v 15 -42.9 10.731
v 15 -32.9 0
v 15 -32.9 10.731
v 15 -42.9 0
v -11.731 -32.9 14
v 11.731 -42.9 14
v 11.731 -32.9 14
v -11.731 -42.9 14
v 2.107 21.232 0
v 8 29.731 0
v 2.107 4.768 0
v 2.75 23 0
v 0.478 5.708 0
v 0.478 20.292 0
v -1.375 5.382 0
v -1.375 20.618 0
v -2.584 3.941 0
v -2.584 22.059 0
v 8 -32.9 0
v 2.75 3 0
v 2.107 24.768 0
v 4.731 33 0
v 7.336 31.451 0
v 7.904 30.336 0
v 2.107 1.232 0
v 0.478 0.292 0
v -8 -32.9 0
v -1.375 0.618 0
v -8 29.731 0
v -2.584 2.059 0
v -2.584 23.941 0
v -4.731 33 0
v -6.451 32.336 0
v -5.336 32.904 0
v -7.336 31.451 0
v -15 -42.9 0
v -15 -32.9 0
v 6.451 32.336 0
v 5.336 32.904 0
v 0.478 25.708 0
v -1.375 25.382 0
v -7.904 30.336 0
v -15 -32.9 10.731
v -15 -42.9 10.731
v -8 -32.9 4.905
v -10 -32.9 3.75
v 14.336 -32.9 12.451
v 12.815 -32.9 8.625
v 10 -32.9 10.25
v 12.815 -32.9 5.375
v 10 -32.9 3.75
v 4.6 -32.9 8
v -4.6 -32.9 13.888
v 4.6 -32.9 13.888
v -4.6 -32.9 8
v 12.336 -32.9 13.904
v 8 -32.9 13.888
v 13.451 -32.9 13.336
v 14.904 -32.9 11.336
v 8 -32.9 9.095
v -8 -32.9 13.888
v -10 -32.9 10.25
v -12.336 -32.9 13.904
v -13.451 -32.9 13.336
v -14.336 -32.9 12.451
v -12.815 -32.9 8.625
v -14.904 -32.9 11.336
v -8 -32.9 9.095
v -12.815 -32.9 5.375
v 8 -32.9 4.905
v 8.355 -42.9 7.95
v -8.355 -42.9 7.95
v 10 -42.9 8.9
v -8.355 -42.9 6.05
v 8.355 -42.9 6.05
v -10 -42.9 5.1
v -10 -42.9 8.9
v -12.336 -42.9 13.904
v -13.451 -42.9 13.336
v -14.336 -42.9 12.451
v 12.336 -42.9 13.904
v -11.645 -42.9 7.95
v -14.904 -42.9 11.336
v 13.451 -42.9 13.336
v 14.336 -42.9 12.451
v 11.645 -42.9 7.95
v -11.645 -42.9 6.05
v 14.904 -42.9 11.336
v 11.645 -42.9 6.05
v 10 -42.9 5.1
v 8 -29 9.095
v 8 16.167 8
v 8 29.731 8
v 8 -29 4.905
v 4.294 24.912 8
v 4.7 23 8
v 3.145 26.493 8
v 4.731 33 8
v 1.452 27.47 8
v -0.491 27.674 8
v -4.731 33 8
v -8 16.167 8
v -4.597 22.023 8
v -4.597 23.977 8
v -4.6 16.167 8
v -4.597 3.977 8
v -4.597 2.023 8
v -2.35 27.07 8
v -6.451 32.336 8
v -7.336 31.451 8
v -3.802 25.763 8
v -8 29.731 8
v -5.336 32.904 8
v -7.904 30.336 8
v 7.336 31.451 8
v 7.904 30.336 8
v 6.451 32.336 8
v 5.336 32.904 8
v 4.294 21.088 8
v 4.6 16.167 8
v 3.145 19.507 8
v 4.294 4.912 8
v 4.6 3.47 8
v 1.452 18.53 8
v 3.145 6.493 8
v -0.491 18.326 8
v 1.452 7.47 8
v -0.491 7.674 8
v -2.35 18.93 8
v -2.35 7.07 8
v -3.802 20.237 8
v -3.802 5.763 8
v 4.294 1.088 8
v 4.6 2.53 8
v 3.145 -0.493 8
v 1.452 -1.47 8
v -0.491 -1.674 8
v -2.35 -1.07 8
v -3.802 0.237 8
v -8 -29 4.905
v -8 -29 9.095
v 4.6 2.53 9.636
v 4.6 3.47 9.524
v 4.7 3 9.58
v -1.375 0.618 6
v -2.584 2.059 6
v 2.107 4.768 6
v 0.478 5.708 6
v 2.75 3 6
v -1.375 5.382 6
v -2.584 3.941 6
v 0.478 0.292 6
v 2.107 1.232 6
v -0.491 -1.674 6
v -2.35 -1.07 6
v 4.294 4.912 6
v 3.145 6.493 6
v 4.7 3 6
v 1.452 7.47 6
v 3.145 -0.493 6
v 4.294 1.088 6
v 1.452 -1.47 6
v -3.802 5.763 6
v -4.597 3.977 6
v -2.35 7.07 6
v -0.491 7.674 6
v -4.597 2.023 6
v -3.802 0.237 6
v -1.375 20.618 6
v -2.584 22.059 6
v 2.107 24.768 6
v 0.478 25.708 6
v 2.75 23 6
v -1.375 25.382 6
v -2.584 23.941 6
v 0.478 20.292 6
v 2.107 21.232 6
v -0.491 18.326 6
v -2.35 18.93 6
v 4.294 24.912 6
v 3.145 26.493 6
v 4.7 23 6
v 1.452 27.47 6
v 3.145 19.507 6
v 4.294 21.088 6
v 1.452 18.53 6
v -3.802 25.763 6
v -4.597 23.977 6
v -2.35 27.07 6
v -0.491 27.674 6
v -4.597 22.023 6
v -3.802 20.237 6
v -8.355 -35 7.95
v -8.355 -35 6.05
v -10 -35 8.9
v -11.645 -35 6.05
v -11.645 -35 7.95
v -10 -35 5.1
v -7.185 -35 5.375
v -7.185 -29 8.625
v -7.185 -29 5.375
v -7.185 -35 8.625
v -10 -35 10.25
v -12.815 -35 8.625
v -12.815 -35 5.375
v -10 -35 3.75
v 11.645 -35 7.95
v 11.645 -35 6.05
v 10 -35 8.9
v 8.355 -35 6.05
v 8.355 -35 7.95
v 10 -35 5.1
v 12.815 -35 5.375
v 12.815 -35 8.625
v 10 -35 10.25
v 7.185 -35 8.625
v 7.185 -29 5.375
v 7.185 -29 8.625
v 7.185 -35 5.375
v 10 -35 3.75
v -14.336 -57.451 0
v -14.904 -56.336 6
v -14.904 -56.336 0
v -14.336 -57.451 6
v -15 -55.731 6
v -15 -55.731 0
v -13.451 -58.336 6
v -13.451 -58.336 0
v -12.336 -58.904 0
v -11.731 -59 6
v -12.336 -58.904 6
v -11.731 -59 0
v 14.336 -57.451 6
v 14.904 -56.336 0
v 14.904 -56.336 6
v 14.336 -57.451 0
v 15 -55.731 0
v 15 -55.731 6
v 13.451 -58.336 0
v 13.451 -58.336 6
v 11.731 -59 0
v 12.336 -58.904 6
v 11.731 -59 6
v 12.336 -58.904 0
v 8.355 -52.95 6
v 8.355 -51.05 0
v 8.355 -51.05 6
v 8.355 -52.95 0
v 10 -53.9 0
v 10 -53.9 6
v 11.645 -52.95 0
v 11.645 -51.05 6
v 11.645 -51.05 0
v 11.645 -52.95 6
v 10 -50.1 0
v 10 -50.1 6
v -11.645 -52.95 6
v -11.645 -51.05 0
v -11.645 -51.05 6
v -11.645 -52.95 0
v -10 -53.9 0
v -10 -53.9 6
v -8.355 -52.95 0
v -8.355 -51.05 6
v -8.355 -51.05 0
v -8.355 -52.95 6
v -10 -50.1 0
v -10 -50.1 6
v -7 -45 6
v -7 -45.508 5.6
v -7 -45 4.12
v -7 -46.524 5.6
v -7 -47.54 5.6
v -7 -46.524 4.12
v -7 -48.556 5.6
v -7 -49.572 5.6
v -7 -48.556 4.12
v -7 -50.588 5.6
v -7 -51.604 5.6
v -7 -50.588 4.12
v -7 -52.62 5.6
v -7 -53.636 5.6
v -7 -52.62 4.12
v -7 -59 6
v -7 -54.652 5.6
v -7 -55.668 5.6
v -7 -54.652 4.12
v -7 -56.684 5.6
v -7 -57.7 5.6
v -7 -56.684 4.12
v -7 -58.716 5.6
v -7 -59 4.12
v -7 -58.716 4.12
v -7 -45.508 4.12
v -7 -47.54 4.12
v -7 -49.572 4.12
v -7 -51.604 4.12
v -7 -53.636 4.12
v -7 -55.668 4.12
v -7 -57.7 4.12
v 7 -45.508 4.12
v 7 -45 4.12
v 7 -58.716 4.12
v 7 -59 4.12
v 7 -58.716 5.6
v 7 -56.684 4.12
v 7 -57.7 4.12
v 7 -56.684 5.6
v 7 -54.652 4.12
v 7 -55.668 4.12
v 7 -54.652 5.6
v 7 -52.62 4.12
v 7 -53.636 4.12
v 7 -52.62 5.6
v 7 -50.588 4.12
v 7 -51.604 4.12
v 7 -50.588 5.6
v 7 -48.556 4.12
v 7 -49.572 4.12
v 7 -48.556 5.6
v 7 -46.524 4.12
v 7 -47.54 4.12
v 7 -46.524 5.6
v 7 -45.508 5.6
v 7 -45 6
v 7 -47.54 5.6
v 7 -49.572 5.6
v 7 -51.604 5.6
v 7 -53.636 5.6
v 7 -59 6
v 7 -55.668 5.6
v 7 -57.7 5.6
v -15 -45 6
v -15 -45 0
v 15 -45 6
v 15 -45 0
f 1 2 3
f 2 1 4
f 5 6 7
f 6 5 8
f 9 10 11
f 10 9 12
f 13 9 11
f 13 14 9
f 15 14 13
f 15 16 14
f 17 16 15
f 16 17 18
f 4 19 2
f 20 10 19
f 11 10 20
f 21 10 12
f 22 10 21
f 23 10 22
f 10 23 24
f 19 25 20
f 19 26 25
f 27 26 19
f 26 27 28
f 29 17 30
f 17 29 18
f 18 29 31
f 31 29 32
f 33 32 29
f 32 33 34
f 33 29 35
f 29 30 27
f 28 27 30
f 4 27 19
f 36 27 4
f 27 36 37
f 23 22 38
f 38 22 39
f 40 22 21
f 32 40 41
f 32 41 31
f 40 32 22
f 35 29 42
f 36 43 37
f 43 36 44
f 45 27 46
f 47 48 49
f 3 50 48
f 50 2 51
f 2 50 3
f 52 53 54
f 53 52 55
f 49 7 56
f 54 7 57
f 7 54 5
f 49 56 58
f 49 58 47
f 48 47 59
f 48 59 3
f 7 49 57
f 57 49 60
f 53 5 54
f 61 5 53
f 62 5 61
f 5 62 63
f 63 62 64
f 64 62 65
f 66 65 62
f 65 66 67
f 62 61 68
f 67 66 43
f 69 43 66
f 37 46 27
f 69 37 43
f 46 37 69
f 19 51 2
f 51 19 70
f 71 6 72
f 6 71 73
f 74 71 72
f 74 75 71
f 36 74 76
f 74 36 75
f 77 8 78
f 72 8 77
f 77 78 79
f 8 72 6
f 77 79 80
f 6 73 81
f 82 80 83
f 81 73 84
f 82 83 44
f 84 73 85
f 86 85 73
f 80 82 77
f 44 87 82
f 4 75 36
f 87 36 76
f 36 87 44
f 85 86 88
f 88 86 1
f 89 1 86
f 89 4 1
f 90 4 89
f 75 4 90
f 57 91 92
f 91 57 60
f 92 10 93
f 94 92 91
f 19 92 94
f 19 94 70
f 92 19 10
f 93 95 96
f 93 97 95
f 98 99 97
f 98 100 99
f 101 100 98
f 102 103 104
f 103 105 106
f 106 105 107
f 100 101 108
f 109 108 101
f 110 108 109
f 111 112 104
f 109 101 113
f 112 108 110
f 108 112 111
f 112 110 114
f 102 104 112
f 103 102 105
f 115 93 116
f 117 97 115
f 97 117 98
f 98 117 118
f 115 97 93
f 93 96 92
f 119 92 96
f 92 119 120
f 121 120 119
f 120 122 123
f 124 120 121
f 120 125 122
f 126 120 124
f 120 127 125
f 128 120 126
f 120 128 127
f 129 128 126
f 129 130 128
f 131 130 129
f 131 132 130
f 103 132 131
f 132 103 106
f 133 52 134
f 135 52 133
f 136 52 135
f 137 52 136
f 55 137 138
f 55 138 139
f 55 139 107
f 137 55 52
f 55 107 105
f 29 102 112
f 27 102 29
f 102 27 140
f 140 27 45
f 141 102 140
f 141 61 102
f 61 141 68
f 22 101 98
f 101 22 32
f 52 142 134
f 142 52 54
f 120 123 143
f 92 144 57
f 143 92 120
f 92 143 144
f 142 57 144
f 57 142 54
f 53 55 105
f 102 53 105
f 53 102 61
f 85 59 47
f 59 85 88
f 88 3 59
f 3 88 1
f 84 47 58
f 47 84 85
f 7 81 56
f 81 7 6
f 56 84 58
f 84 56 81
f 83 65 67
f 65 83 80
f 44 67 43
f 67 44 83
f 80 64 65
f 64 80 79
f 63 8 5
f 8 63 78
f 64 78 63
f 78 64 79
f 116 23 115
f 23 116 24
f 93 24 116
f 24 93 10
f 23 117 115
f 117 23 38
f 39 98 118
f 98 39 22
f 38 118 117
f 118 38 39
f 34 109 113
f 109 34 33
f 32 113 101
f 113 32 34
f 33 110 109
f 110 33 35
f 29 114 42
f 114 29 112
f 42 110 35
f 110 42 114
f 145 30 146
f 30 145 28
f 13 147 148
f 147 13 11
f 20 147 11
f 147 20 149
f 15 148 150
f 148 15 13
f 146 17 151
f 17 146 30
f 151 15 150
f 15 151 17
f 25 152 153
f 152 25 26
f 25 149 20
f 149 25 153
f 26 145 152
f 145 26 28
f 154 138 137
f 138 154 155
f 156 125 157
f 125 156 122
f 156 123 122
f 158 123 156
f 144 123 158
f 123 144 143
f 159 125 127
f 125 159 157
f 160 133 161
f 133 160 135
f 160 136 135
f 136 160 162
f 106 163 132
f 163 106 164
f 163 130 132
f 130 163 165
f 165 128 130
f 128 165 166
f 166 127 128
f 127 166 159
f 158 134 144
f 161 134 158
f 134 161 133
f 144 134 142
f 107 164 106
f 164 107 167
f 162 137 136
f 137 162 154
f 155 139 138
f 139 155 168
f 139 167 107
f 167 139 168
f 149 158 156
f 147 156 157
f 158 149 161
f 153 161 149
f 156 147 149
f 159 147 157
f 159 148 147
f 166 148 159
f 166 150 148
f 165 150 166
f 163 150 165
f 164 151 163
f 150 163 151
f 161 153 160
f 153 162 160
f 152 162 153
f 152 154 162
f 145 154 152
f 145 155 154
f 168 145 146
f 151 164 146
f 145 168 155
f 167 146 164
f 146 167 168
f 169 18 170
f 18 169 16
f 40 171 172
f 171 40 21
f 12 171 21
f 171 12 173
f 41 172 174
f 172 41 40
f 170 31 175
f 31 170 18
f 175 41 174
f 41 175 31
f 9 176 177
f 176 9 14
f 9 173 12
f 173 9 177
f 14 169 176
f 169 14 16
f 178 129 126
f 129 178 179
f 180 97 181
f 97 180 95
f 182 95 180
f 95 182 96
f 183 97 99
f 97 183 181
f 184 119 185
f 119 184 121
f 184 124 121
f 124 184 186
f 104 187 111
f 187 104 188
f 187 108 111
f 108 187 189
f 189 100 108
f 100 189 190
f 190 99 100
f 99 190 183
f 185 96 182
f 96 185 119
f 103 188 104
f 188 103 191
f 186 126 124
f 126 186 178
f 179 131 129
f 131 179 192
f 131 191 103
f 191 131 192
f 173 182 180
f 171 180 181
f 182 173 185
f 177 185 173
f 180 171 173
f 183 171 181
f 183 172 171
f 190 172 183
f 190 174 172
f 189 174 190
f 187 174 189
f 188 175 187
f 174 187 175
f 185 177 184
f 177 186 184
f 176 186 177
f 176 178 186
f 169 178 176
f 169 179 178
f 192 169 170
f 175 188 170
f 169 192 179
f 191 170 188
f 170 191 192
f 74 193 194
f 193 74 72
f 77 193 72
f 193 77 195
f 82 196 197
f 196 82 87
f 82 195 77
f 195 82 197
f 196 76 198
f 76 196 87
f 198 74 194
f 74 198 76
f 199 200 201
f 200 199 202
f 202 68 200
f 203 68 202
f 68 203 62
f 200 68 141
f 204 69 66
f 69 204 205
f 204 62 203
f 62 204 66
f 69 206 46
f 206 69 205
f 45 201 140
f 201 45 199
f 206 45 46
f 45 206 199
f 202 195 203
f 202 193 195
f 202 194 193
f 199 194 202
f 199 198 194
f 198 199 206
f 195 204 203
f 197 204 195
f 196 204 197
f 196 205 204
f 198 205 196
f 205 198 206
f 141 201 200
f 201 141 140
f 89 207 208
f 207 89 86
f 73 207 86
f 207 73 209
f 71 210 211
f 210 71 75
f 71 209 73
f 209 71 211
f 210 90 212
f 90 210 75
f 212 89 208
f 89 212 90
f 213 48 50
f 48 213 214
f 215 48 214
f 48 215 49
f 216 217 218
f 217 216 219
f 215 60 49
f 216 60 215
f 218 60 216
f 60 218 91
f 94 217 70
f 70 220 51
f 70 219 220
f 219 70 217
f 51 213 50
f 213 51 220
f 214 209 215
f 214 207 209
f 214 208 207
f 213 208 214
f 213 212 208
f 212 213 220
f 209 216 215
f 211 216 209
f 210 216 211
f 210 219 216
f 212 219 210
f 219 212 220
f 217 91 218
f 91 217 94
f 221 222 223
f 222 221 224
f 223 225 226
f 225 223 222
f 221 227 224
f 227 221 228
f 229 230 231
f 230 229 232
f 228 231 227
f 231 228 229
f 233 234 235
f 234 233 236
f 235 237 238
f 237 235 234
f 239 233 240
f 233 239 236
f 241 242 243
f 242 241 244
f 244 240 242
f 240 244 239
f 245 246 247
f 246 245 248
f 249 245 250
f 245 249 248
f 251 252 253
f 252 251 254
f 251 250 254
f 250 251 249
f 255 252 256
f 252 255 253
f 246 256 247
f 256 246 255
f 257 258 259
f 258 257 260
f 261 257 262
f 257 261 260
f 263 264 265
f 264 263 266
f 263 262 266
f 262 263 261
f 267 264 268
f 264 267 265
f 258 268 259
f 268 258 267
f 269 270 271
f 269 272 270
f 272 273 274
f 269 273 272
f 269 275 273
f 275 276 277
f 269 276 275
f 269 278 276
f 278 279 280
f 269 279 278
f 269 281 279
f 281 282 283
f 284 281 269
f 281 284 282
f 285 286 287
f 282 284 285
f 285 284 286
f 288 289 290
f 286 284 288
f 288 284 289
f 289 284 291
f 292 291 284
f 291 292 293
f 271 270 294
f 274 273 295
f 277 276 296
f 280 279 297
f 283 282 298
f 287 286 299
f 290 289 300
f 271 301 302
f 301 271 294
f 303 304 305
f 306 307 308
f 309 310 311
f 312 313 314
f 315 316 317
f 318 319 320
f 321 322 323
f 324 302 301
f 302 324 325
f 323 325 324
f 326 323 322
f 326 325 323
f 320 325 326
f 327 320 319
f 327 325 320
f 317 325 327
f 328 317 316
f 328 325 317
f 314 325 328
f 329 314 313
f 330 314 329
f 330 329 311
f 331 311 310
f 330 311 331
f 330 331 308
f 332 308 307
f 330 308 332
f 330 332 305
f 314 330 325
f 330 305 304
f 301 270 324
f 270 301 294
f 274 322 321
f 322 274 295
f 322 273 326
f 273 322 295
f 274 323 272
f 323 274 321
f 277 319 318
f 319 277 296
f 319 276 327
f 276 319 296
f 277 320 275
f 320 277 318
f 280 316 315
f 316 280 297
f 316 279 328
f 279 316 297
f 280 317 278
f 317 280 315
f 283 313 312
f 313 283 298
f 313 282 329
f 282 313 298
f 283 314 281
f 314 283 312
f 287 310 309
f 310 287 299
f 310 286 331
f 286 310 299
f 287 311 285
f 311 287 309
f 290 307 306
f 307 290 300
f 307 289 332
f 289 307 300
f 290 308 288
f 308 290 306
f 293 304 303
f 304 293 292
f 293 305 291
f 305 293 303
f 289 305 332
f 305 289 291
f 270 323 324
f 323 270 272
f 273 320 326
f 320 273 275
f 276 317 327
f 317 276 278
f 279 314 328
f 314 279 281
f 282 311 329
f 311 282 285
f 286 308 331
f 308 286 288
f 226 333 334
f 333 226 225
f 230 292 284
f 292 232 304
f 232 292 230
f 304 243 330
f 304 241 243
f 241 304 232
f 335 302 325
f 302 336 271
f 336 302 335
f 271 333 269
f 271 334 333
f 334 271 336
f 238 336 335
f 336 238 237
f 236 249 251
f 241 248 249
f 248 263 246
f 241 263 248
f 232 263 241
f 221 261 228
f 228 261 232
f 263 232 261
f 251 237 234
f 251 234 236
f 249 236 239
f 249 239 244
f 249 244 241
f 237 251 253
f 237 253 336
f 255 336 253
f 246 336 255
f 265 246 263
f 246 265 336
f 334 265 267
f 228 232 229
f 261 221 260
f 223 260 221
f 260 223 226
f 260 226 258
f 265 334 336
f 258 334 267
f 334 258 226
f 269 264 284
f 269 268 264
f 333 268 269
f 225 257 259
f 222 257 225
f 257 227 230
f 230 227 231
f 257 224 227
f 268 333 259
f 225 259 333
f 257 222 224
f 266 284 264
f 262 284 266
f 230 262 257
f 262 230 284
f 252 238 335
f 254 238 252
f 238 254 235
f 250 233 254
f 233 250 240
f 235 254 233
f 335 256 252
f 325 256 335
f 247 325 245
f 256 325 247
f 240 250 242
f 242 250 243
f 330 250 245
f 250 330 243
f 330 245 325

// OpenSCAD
// This printed part is one possible way to anchor Shapeoko belts.
// See http://www.shapeoko.com/wiki/index.php/Belt_Anchors for other ideas.
// Motivated by http://www.thingiverse.com/thing:33881 not being strong enough
// when I initially printed it.

// Upright: printed, but not stress tested, looks sturdy
// Top: completely untested

gThick = 8;
gRibHeight = 6;
gTopRoundoverRadius = 4;
gSideRoundoverRadius = 4;
gMainWidth = 16;
gMainHeight = 66;

gTopWidth = 30;
gRibWidth = 3.4;
gRibLength = 50;
gHoleSpacing = 20;
gBeltWide = 14; // 1/4" belt + slop
gBeltPitch = 2.032; // MXL in mm
gBeltThick = 1.5;
e = 0.02;

// screw_clearance_diameter, socket_head_clearance_diameter, nut outside diameter
// TODO untested numbers, these should move to a common include.
M3 = [3.8, 6.4, 6.5];
M5 = [5.5, 9.4, 9.4];
M8 = [8, 13, 13];

module InsetHole(x) {
  d = x[0];
  socket_head = x[1];
  union() {
    translate([0,0,-50]) cylinder(r=d/2, h=100);
    cylinder(r=socket_head/2, h=10);
  }
}

module NutHole(x) {
  d = x[0];
  nut_size = x[2];
  union() {
    translate([0,0,1]) cylinder(r=d/2, h=50);
    cylinder(r=nut_size/2, $fn=6, h=6);
  }
}

module Rib(t=4) {
  translate([-t/2,0,-0.1])
    rotate([90,0,90])
      linear_extrude(height=t)
        polygon(points=[[0,0],[gRibLength,0],[0,gRibHeight]],paths=[[0,1,2]]);
}

module Roundover(r) {
  translate([0.1,0.1,-50])
    difference() {
      cube([r,r,100]);
      translate([0,0,-1]) cylinder(r=r,h=102,$fn=20);
    }
}

module Upright() {
  difference() {
    union() {
      // body, for now (until beziers work)
      translate([0,-gMainHeight/2-4.9,(gThick+gRibHeight)/2]) cube([gTopWidth,10,gThick+gRibHeight], center=true);
      translate([0,0,gThick/2]) cube([gMainWidth,gMainHeight,gThick], center=true);
      // ribs
      translate([(gMainWidth-gRibWidth)/2,-gMainHeight/2,gThick]) Rib(t=gRibWidth);
      translate([-(gMainWidth-gRibWidth)/2,-gMainHeight/2,gThick]) Rib(t=gRibWidth);
    }
    // Chamfer top edges
    // TODO make these translation numbers constants as well, and fix Roundover's
    // origin.
    translate([gTopWidth/2-gTopRoundoverRadius,0,gThick+gRibHeight-gTopRoundoverRadius])
      rotate([90,0,0])
        Roundover(r=gTopRoundoverRadius);
    translate([-(gTopWidth/2-gTopRoundoverRadius),0,gThick+gRibHeight-gTopRoundoverRadius])
      rotate([90,0,180])
        Roundover(r=gTopRoundoverRadius);
    // Chamfer edges near bottom mounting hole
    translate([gMainWidth/2-gSideRoundoverRadius,gMainHeight/2-4,0])
      Roundover(r=gSideRoundoverRadius);
    translate([-(gMainWidth/2-gSideRoundoverRadius),gMainHeight/2-4,0])
      rotate([0,0,90])
        Roundover(r=gSideRoundoverRadius);
    // M5 mounting holes
    translate([0,gMainHeight/2-30,gThick-2]) InsetHole(M5);
    translate([0,gMainHeight/2-10,gThick-2]) InsetHole(M5);
    // M3 nut traps (20mm spacing, for compat with old part)
    translate([-gHoleSpacing/2,-gMainHeight/2+4,(gThick+gRibHeight)/2]) rotate([90,-90,0]) NutHole(M3);
    translate([gHoleSpacing/2,-gMainHeight/2+4,(gThick+gRibHeight)/2]) rotate([90,-90,0]) NutHole(M3);
  }
}

module Belt() {
  translate([0,0,gBeltThick/2]) cube([gBeltWide,30,gBeltThick], center=true);
  for(i = [0:30/gBeltPitch]) {
    translate([0,i * gBeltPitch,-gBeltThick/2+e]) cube([gBeltWide,gBeltPitch / 2,gBeltThick], center=true);
  }
}

module Top() {
  rotate([-90,0,0]) difference() {
    translate([0,-6/2,(gThick+gRibHeight)/2]) cube([gTopWidth,6,gThick+gRibHeight], center=true);
    // holes
    translate([-gHoleSpacing/2,20,(gThick+gRibHeight)/2]) rotate([90,-90,0]) NutHole(M3);
    translate([gHoleSpacing/2,20,(gThick+gRibHeight)/2]) rotate([90,-90,0]) NutHole(M3);
    // chamfer
    translate([gTopWidth/2-gTopRoundoverRadius,0,gThick+gRibHeight-gTopRoundoverRadius])
      rotate([90,0,0])
        Roundover(r=gTopRoundoverRadius);
    translate([-(gTopWidth/2-gTopRoundoverRadius),0,gThick+gRibHeight-gTopRoundoverRadius])
      rotate([90,0,180])
        Roundover(r=gTopRoundoverRadius);
    // TODO remove magic number
    translate([0,-8+(1.6*gBeltThick),0]) rotate([90,0,0]) Belt();
  }
}

union() {
  Upright();
  translate([0,-gMainHeight/2-12,0]) rotate([0,0,180]) Top();
}
//union() {
//  for(i=[1:4]) {
//    translate([0,-15*i,0]) Top();
//  }
//}
